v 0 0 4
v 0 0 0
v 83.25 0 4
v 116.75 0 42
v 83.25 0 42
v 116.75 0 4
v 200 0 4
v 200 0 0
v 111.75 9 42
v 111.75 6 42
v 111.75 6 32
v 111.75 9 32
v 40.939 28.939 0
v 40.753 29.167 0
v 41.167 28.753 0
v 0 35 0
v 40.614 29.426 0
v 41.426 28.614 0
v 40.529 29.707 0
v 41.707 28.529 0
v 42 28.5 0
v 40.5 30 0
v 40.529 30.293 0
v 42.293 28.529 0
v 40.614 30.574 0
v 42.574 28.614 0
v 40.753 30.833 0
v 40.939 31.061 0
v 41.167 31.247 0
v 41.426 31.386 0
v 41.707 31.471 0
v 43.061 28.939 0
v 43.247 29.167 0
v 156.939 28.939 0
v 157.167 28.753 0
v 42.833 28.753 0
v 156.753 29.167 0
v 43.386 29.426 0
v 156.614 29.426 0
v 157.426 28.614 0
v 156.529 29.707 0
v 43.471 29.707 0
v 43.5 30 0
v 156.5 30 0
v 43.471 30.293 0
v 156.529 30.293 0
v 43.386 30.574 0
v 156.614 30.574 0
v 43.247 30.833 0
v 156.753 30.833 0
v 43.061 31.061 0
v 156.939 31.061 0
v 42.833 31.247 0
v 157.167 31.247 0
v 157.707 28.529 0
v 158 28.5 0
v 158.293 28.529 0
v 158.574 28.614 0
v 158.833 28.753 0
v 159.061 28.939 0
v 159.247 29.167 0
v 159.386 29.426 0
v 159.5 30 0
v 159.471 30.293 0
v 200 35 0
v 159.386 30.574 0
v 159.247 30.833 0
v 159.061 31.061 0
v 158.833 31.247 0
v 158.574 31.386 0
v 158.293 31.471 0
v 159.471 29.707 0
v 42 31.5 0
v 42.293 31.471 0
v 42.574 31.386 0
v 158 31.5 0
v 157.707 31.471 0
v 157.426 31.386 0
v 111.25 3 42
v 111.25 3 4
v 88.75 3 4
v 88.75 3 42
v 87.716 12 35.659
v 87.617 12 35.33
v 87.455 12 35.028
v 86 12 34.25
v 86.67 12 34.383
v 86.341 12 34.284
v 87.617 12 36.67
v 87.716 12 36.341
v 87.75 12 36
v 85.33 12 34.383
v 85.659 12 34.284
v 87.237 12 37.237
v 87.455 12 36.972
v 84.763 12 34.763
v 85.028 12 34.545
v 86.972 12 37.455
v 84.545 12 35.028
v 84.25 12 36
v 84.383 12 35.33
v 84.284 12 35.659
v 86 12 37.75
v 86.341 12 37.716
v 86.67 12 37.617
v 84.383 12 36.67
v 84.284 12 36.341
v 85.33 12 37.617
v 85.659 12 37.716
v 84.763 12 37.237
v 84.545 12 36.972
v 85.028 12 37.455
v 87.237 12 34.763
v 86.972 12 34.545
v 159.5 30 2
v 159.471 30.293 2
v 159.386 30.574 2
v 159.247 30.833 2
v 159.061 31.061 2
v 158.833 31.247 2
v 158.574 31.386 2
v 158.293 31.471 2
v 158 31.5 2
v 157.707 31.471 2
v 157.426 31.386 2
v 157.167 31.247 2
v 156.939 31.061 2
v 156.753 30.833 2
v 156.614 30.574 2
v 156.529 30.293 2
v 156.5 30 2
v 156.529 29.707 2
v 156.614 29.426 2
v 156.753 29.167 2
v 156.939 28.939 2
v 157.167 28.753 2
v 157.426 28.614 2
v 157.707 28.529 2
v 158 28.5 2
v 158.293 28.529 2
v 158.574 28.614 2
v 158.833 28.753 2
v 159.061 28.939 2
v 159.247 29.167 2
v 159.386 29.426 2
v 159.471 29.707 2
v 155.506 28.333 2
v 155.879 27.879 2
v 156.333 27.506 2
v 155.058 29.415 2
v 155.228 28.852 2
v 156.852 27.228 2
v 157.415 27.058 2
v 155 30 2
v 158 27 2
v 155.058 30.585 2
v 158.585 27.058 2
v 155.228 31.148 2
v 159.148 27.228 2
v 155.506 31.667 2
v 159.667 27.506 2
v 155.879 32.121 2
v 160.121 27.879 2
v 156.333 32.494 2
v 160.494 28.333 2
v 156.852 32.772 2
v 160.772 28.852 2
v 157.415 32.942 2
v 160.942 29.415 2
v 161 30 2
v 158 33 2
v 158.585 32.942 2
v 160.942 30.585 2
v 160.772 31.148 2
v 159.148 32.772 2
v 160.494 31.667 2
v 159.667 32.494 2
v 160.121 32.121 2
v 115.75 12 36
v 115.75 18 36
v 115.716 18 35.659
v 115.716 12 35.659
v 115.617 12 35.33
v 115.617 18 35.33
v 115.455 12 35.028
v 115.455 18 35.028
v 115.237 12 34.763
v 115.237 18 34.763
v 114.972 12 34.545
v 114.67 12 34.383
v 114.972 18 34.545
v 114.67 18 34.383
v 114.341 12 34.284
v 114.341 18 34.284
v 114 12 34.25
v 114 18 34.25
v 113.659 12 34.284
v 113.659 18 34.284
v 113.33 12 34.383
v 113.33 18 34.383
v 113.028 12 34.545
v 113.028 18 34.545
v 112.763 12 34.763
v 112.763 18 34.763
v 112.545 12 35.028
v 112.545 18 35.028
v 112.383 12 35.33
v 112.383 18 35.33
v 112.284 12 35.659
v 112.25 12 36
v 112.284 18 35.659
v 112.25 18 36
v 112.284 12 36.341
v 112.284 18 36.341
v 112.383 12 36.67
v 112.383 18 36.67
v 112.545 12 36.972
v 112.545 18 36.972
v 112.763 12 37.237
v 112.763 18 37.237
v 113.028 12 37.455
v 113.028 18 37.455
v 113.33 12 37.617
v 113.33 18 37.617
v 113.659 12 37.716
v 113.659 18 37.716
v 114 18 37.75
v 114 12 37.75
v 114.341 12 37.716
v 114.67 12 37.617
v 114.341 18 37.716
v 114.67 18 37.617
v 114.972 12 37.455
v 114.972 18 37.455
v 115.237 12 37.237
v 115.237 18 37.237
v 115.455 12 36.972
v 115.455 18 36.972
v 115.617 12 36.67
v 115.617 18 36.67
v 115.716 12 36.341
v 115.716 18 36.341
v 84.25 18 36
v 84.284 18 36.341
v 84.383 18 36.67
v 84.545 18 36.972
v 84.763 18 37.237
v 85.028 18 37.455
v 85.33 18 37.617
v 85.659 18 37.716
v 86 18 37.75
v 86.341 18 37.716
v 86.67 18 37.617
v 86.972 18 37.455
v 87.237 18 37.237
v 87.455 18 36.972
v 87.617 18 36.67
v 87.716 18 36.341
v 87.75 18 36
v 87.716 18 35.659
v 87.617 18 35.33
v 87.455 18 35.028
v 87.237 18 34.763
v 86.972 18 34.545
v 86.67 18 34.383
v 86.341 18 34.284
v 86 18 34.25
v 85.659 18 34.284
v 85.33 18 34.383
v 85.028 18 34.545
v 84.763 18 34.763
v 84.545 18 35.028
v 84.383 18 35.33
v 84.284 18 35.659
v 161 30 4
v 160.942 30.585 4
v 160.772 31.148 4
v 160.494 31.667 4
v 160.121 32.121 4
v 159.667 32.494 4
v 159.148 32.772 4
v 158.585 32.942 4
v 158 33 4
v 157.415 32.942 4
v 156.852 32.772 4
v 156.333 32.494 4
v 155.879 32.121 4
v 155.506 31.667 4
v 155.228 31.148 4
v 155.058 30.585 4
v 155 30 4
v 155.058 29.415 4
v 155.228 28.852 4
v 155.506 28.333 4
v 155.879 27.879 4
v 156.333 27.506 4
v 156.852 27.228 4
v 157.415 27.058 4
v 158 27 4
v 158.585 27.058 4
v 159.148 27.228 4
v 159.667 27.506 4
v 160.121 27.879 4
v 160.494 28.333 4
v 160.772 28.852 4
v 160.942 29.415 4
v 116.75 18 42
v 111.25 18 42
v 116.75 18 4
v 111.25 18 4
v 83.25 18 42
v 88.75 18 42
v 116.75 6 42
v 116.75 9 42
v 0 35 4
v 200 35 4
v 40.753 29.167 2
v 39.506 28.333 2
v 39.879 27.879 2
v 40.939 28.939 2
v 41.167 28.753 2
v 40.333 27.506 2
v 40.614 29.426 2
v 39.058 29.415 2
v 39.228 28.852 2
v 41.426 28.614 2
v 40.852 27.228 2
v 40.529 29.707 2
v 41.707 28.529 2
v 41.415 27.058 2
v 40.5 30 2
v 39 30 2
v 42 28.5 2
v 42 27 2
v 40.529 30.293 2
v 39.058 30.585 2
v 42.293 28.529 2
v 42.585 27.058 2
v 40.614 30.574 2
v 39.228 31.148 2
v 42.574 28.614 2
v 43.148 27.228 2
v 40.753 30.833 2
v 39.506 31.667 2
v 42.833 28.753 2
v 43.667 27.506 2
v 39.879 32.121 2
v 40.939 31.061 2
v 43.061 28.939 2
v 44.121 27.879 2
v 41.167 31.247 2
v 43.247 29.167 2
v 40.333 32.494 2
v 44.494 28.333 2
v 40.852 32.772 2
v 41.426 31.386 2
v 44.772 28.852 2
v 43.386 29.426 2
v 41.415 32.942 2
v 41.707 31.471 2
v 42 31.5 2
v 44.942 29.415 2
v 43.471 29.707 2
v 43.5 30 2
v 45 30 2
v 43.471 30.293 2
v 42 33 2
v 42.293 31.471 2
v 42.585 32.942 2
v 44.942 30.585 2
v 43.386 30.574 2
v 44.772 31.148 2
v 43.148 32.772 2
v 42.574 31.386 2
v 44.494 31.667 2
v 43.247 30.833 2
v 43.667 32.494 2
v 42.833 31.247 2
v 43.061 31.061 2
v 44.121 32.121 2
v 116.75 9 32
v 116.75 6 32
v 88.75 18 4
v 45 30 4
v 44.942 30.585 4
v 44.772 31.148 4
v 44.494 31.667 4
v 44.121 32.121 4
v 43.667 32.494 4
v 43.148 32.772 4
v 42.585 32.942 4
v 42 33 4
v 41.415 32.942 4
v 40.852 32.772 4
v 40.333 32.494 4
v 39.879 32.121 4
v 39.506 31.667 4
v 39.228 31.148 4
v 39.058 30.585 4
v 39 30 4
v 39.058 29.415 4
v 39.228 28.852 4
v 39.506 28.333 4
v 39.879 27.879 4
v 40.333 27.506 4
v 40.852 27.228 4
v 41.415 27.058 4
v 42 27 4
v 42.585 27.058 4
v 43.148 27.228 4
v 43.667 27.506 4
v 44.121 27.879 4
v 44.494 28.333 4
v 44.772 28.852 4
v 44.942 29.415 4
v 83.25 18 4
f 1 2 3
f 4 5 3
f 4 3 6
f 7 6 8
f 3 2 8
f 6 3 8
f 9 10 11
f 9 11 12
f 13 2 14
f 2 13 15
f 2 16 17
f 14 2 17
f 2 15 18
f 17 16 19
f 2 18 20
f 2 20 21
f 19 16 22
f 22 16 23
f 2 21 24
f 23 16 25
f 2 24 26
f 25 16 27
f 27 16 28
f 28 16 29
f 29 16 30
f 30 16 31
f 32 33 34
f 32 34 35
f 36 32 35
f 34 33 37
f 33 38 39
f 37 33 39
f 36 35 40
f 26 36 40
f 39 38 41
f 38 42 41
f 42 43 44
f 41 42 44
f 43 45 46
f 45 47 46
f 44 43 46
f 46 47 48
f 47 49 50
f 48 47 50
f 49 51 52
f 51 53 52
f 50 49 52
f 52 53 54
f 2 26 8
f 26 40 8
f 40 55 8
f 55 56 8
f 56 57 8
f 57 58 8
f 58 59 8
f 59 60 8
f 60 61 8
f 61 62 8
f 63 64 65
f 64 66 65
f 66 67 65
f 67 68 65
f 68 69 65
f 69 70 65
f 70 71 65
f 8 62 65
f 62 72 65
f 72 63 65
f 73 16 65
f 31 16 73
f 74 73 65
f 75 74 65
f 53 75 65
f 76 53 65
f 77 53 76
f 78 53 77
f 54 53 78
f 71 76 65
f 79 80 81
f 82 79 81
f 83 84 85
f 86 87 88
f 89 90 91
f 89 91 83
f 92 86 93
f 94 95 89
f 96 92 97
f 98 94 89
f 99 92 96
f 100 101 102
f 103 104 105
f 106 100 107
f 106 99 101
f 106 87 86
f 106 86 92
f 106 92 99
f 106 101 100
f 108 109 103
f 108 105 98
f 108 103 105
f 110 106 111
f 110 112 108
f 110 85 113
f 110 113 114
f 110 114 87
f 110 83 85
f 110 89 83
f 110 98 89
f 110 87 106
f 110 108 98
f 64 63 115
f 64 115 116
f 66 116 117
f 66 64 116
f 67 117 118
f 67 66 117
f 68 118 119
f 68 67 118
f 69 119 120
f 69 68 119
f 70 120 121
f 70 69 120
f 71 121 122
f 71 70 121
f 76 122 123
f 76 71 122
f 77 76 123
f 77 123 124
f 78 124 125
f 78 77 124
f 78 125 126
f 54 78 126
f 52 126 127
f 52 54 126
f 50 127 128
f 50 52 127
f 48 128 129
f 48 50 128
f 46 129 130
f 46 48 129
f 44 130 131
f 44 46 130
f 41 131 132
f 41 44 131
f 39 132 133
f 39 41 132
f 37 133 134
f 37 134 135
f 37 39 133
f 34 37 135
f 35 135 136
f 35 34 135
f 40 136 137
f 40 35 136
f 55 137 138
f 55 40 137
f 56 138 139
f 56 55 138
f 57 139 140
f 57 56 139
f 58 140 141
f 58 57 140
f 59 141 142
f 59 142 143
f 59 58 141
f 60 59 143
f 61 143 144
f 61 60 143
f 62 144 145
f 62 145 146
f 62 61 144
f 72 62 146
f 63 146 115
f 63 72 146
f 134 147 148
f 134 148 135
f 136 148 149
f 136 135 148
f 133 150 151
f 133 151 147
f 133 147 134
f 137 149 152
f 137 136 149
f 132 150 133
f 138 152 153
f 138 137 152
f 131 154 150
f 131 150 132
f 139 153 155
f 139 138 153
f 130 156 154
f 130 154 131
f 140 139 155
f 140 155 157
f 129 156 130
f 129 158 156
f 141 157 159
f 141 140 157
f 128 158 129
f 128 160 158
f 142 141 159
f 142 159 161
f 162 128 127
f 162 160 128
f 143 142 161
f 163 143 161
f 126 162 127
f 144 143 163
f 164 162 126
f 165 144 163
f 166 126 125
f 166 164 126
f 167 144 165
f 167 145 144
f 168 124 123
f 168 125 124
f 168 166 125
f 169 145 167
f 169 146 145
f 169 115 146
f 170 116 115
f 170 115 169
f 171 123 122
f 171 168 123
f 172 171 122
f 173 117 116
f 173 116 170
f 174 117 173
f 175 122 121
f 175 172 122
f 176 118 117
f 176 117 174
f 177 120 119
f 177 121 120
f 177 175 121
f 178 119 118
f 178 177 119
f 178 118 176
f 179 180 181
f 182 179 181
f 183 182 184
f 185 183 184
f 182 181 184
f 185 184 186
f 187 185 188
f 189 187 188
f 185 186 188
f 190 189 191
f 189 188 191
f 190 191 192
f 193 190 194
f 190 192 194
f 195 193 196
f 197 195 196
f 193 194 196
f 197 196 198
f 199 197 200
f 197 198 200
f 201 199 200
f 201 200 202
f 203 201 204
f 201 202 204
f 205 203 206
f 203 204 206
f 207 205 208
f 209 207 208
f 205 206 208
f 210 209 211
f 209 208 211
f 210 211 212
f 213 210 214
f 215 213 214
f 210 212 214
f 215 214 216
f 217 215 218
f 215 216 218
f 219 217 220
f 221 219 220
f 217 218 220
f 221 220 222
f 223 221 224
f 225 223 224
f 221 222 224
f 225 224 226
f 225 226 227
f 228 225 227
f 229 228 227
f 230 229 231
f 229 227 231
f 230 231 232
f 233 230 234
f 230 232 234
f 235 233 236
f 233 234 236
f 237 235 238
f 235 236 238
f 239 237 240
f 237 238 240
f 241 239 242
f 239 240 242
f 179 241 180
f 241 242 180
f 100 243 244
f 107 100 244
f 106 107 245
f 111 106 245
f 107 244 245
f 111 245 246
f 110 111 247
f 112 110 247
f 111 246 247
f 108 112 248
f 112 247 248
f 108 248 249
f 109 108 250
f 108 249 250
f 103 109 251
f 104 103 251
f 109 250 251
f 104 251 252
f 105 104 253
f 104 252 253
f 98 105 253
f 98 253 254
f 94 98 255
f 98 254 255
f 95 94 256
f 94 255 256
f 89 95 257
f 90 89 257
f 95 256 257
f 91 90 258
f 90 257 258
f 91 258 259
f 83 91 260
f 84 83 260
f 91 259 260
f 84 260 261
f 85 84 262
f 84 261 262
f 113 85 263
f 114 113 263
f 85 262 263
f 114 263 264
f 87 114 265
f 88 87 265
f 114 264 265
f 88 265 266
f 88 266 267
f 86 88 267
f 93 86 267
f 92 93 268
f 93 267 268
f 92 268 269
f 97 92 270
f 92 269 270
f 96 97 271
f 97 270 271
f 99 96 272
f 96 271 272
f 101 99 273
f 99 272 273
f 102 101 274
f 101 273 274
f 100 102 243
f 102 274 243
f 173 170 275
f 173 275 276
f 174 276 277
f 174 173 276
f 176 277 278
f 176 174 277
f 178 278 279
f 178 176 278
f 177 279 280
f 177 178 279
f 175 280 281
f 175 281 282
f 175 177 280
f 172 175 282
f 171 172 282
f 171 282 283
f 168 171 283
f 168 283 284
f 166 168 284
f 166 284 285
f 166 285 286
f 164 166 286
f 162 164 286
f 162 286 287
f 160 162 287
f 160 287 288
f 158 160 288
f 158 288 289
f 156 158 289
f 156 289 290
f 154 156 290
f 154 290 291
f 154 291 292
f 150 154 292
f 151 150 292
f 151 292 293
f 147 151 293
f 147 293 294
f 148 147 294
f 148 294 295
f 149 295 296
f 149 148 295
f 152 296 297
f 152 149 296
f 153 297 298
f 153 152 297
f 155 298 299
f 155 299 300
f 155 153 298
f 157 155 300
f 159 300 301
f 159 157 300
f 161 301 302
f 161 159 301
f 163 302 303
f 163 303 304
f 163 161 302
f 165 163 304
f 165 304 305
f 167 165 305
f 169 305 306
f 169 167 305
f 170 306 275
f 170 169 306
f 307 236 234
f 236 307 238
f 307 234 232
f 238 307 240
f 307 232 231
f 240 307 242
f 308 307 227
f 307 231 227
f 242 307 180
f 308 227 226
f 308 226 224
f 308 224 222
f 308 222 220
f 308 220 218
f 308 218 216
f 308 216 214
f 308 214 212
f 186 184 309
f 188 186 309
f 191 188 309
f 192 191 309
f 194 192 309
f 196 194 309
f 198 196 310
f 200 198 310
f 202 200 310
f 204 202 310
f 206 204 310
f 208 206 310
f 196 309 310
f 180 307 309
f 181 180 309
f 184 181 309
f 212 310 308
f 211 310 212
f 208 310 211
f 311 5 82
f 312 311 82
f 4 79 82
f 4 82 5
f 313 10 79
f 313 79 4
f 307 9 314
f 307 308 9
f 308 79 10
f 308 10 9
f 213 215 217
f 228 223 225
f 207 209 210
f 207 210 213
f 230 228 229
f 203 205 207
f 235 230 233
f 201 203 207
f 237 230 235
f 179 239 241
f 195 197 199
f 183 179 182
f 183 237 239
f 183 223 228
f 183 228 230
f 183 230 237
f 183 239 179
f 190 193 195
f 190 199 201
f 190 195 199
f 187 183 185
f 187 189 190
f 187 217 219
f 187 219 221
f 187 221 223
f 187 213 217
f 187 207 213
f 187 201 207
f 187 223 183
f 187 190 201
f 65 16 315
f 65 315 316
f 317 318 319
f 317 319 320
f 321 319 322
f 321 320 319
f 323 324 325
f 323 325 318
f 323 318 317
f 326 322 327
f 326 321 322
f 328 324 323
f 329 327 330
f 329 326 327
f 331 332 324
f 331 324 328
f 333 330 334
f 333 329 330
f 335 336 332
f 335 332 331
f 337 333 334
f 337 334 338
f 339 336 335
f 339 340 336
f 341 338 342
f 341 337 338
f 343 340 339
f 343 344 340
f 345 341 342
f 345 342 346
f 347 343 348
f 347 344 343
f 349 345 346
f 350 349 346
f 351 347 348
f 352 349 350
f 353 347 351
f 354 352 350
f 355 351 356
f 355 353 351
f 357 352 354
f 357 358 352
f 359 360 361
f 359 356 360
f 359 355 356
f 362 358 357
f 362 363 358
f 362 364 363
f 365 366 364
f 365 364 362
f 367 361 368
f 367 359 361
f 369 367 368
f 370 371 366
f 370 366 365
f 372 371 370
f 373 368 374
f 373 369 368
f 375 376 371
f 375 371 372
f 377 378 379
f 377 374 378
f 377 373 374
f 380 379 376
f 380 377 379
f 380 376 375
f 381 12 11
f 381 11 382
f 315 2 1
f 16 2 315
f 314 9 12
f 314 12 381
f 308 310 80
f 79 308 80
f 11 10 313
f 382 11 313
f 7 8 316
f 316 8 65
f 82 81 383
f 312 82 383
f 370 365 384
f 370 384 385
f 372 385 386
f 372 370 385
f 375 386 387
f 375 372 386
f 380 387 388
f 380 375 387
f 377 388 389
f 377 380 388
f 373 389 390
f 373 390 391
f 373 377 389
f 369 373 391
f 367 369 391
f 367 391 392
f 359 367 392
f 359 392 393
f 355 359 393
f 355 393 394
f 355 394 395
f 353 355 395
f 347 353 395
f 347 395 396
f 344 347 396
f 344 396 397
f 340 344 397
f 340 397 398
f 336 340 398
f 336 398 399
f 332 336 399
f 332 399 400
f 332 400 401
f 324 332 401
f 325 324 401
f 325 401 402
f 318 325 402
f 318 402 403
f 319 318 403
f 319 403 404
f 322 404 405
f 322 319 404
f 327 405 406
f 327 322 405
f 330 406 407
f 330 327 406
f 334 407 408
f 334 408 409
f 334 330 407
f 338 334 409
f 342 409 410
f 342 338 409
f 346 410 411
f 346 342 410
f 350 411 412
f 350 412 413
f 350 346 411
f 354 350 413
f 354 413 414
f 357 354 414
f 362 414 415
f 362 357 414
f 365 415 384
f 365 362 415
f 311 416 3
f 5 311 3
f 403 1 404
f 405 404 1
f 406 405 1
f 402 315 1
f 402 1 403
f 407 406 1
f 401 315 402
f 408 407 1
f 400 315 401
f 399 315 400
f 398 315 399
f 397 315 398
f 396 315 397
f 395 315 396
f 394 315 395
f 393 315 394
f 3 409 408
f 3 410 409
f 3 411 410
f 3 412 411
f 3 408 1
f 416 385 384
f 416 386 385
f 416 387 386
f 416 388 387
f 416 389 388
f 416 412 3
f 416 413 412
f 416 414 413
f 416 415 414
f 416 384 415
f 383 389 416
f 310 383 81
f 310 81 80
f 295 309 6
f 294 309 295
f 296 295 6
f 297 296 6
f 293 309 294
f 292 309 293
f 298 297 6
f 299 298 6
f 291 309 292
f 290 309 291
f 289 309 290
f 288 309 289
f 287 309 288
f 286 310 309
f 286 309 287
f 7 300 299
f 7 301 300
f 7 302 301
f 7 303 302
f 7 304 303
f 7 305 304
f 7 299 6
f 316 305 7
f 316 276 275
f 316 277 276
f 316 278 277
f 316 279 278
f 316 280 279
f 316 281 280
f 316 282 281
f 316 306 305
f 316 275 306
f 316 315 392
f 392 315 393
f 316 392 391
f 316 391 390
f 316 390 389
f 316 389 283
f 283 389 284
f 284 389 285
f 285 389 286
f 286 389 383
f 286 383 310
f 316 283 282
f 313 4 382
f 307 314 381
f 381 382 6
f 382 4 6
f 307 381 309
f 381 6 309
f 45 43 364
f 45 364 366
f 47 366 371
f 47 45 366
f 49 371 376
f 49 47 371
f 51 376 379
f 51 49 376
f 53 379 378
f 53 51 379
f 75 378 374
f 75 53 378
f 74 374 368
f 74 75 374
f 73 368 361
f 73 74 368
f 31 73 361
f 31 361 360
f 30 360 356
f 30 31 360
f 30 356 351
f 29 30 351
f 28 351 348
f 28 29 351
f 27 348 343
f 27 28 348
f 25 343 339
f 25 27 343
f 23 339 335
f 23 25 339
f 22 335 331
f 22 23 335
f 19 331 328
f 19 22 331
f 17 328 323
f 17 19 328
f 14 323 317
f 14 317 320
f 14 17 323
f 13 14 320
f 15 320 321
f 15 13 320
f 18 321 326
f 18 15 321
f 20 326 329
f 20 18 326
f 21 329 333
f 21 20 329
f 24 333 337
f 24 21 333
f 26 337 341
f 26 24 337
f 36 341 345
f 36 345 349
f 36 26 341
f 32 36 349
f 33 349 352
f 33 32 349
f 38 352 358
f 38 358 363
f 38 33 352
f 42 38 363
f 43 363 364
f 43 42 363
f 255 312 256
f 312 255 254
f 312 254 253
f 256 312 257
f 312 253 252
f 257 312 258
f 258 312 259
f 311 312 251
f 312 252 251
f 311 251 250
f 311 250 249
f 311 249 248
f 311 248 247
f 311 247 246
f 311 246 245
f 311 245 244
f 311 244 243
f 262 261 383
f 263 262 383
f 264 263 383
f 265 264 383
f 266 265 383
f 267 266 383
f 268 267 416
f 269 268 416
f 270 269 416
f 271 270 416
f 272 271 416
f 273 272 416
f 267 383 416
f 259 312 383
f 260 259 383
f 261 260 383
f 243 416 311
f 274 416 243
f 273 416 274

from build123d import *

# Parameters (mm, degrees)
SKETCH1_W           = 200
SKETCH1_H           = 35
SKETCH1_R           = 3
BODY_DEPTH          = 4
SKETCH1_3_R         = 3
SKETCH1_3_R_2       = 1.5
SCREW_INSERTS_DEPTH = 2
SERVO_INSERT_DEPTH  = 38
SKETCH3_W           = 5
SKETCH3_H           = 3
WIRE_CHANNEL_DEPTH  = 10
SKETCH4_R           = 1.75
M2X4X3_5_DEPTH      = 6


with BuildPart() as part:
    # Sketch1 → Body (new body)
    with BuildSketch(Plane.XY):
        with Locations((100, 17.5)):
            Rectangle(SKETCH1_W, SKETCH1_H)
        with Locations((158, 30)):
            Circle(SKETCH1_R, mode=Mode.SUBTRACT)
        with Locations((42, 30)):
            Circle(SKETCH1_R, mode=Mode.SUBTRACT)
    extrude(amount=BODY_DEPTH)

    # Sketch1<3> → Screw Inserts (add)
    # profile 1 of 2: a face of its own
    with BuildSketch(Plane.XY):
        with Locations((158, 30)):
            Circle(SKETCH1_3_R)
        with Locations((158, 30)):
            Circle(SKETCH1_3_R_2, mode=Mode.SUBTRACT)
    # profile 2 of 2: a face of its own
    with BuildSketch(Plane.XY):
        with Locations((42, 30)):
            Circle(SKETCH1_3_R)
        with Locations((42, 30)):
            Circle(SKETCH1_3_R_2, mode=Mode.SUBTRACT)
    extrude(amount=SCREW_INSERTS_DEPTH)

    # Sketch2 → Servo Insert (add)
    with BuildSketch(Plane.XY.offset(4)):
        Polygon((88.75, 18), (83.25, 18), (83.25, 0), (116.75, 0), (116.75, 18), (111.25, 18), (111.25, 3), (88.75, 3), align=None)
    extrude(amount=SERVO_INSERT_DEPTH)

    # Sketch3 → Wire Channel (cut)
    with BuildSketch(Plane.XY.offset(42)):
        with Locations((114.25, 7.5)):
            Rectangle(SKETCH3_W, SKETCH3_H)
    extrude(amount=-WIRE_CHANNEL_DEPTH, mode=Mode.SUBTRACT)

    # Sketch4 → M2x4x3.5 (cut)
    with BuildSketch(Plane(origin=(0, 18, 0), x_dir=(1, 0, 0), z_dir=(0, 1, 0))):
        with Locations((86, -36)):
            Circle(SKETCH4_R)
        with Locations((114, -36)):
            Circle(SKETCH4_R)
    extrude(amount=-M2X4X3_5_DEPTH, mode=Mode.SUBTRACT)


solid = part.part
